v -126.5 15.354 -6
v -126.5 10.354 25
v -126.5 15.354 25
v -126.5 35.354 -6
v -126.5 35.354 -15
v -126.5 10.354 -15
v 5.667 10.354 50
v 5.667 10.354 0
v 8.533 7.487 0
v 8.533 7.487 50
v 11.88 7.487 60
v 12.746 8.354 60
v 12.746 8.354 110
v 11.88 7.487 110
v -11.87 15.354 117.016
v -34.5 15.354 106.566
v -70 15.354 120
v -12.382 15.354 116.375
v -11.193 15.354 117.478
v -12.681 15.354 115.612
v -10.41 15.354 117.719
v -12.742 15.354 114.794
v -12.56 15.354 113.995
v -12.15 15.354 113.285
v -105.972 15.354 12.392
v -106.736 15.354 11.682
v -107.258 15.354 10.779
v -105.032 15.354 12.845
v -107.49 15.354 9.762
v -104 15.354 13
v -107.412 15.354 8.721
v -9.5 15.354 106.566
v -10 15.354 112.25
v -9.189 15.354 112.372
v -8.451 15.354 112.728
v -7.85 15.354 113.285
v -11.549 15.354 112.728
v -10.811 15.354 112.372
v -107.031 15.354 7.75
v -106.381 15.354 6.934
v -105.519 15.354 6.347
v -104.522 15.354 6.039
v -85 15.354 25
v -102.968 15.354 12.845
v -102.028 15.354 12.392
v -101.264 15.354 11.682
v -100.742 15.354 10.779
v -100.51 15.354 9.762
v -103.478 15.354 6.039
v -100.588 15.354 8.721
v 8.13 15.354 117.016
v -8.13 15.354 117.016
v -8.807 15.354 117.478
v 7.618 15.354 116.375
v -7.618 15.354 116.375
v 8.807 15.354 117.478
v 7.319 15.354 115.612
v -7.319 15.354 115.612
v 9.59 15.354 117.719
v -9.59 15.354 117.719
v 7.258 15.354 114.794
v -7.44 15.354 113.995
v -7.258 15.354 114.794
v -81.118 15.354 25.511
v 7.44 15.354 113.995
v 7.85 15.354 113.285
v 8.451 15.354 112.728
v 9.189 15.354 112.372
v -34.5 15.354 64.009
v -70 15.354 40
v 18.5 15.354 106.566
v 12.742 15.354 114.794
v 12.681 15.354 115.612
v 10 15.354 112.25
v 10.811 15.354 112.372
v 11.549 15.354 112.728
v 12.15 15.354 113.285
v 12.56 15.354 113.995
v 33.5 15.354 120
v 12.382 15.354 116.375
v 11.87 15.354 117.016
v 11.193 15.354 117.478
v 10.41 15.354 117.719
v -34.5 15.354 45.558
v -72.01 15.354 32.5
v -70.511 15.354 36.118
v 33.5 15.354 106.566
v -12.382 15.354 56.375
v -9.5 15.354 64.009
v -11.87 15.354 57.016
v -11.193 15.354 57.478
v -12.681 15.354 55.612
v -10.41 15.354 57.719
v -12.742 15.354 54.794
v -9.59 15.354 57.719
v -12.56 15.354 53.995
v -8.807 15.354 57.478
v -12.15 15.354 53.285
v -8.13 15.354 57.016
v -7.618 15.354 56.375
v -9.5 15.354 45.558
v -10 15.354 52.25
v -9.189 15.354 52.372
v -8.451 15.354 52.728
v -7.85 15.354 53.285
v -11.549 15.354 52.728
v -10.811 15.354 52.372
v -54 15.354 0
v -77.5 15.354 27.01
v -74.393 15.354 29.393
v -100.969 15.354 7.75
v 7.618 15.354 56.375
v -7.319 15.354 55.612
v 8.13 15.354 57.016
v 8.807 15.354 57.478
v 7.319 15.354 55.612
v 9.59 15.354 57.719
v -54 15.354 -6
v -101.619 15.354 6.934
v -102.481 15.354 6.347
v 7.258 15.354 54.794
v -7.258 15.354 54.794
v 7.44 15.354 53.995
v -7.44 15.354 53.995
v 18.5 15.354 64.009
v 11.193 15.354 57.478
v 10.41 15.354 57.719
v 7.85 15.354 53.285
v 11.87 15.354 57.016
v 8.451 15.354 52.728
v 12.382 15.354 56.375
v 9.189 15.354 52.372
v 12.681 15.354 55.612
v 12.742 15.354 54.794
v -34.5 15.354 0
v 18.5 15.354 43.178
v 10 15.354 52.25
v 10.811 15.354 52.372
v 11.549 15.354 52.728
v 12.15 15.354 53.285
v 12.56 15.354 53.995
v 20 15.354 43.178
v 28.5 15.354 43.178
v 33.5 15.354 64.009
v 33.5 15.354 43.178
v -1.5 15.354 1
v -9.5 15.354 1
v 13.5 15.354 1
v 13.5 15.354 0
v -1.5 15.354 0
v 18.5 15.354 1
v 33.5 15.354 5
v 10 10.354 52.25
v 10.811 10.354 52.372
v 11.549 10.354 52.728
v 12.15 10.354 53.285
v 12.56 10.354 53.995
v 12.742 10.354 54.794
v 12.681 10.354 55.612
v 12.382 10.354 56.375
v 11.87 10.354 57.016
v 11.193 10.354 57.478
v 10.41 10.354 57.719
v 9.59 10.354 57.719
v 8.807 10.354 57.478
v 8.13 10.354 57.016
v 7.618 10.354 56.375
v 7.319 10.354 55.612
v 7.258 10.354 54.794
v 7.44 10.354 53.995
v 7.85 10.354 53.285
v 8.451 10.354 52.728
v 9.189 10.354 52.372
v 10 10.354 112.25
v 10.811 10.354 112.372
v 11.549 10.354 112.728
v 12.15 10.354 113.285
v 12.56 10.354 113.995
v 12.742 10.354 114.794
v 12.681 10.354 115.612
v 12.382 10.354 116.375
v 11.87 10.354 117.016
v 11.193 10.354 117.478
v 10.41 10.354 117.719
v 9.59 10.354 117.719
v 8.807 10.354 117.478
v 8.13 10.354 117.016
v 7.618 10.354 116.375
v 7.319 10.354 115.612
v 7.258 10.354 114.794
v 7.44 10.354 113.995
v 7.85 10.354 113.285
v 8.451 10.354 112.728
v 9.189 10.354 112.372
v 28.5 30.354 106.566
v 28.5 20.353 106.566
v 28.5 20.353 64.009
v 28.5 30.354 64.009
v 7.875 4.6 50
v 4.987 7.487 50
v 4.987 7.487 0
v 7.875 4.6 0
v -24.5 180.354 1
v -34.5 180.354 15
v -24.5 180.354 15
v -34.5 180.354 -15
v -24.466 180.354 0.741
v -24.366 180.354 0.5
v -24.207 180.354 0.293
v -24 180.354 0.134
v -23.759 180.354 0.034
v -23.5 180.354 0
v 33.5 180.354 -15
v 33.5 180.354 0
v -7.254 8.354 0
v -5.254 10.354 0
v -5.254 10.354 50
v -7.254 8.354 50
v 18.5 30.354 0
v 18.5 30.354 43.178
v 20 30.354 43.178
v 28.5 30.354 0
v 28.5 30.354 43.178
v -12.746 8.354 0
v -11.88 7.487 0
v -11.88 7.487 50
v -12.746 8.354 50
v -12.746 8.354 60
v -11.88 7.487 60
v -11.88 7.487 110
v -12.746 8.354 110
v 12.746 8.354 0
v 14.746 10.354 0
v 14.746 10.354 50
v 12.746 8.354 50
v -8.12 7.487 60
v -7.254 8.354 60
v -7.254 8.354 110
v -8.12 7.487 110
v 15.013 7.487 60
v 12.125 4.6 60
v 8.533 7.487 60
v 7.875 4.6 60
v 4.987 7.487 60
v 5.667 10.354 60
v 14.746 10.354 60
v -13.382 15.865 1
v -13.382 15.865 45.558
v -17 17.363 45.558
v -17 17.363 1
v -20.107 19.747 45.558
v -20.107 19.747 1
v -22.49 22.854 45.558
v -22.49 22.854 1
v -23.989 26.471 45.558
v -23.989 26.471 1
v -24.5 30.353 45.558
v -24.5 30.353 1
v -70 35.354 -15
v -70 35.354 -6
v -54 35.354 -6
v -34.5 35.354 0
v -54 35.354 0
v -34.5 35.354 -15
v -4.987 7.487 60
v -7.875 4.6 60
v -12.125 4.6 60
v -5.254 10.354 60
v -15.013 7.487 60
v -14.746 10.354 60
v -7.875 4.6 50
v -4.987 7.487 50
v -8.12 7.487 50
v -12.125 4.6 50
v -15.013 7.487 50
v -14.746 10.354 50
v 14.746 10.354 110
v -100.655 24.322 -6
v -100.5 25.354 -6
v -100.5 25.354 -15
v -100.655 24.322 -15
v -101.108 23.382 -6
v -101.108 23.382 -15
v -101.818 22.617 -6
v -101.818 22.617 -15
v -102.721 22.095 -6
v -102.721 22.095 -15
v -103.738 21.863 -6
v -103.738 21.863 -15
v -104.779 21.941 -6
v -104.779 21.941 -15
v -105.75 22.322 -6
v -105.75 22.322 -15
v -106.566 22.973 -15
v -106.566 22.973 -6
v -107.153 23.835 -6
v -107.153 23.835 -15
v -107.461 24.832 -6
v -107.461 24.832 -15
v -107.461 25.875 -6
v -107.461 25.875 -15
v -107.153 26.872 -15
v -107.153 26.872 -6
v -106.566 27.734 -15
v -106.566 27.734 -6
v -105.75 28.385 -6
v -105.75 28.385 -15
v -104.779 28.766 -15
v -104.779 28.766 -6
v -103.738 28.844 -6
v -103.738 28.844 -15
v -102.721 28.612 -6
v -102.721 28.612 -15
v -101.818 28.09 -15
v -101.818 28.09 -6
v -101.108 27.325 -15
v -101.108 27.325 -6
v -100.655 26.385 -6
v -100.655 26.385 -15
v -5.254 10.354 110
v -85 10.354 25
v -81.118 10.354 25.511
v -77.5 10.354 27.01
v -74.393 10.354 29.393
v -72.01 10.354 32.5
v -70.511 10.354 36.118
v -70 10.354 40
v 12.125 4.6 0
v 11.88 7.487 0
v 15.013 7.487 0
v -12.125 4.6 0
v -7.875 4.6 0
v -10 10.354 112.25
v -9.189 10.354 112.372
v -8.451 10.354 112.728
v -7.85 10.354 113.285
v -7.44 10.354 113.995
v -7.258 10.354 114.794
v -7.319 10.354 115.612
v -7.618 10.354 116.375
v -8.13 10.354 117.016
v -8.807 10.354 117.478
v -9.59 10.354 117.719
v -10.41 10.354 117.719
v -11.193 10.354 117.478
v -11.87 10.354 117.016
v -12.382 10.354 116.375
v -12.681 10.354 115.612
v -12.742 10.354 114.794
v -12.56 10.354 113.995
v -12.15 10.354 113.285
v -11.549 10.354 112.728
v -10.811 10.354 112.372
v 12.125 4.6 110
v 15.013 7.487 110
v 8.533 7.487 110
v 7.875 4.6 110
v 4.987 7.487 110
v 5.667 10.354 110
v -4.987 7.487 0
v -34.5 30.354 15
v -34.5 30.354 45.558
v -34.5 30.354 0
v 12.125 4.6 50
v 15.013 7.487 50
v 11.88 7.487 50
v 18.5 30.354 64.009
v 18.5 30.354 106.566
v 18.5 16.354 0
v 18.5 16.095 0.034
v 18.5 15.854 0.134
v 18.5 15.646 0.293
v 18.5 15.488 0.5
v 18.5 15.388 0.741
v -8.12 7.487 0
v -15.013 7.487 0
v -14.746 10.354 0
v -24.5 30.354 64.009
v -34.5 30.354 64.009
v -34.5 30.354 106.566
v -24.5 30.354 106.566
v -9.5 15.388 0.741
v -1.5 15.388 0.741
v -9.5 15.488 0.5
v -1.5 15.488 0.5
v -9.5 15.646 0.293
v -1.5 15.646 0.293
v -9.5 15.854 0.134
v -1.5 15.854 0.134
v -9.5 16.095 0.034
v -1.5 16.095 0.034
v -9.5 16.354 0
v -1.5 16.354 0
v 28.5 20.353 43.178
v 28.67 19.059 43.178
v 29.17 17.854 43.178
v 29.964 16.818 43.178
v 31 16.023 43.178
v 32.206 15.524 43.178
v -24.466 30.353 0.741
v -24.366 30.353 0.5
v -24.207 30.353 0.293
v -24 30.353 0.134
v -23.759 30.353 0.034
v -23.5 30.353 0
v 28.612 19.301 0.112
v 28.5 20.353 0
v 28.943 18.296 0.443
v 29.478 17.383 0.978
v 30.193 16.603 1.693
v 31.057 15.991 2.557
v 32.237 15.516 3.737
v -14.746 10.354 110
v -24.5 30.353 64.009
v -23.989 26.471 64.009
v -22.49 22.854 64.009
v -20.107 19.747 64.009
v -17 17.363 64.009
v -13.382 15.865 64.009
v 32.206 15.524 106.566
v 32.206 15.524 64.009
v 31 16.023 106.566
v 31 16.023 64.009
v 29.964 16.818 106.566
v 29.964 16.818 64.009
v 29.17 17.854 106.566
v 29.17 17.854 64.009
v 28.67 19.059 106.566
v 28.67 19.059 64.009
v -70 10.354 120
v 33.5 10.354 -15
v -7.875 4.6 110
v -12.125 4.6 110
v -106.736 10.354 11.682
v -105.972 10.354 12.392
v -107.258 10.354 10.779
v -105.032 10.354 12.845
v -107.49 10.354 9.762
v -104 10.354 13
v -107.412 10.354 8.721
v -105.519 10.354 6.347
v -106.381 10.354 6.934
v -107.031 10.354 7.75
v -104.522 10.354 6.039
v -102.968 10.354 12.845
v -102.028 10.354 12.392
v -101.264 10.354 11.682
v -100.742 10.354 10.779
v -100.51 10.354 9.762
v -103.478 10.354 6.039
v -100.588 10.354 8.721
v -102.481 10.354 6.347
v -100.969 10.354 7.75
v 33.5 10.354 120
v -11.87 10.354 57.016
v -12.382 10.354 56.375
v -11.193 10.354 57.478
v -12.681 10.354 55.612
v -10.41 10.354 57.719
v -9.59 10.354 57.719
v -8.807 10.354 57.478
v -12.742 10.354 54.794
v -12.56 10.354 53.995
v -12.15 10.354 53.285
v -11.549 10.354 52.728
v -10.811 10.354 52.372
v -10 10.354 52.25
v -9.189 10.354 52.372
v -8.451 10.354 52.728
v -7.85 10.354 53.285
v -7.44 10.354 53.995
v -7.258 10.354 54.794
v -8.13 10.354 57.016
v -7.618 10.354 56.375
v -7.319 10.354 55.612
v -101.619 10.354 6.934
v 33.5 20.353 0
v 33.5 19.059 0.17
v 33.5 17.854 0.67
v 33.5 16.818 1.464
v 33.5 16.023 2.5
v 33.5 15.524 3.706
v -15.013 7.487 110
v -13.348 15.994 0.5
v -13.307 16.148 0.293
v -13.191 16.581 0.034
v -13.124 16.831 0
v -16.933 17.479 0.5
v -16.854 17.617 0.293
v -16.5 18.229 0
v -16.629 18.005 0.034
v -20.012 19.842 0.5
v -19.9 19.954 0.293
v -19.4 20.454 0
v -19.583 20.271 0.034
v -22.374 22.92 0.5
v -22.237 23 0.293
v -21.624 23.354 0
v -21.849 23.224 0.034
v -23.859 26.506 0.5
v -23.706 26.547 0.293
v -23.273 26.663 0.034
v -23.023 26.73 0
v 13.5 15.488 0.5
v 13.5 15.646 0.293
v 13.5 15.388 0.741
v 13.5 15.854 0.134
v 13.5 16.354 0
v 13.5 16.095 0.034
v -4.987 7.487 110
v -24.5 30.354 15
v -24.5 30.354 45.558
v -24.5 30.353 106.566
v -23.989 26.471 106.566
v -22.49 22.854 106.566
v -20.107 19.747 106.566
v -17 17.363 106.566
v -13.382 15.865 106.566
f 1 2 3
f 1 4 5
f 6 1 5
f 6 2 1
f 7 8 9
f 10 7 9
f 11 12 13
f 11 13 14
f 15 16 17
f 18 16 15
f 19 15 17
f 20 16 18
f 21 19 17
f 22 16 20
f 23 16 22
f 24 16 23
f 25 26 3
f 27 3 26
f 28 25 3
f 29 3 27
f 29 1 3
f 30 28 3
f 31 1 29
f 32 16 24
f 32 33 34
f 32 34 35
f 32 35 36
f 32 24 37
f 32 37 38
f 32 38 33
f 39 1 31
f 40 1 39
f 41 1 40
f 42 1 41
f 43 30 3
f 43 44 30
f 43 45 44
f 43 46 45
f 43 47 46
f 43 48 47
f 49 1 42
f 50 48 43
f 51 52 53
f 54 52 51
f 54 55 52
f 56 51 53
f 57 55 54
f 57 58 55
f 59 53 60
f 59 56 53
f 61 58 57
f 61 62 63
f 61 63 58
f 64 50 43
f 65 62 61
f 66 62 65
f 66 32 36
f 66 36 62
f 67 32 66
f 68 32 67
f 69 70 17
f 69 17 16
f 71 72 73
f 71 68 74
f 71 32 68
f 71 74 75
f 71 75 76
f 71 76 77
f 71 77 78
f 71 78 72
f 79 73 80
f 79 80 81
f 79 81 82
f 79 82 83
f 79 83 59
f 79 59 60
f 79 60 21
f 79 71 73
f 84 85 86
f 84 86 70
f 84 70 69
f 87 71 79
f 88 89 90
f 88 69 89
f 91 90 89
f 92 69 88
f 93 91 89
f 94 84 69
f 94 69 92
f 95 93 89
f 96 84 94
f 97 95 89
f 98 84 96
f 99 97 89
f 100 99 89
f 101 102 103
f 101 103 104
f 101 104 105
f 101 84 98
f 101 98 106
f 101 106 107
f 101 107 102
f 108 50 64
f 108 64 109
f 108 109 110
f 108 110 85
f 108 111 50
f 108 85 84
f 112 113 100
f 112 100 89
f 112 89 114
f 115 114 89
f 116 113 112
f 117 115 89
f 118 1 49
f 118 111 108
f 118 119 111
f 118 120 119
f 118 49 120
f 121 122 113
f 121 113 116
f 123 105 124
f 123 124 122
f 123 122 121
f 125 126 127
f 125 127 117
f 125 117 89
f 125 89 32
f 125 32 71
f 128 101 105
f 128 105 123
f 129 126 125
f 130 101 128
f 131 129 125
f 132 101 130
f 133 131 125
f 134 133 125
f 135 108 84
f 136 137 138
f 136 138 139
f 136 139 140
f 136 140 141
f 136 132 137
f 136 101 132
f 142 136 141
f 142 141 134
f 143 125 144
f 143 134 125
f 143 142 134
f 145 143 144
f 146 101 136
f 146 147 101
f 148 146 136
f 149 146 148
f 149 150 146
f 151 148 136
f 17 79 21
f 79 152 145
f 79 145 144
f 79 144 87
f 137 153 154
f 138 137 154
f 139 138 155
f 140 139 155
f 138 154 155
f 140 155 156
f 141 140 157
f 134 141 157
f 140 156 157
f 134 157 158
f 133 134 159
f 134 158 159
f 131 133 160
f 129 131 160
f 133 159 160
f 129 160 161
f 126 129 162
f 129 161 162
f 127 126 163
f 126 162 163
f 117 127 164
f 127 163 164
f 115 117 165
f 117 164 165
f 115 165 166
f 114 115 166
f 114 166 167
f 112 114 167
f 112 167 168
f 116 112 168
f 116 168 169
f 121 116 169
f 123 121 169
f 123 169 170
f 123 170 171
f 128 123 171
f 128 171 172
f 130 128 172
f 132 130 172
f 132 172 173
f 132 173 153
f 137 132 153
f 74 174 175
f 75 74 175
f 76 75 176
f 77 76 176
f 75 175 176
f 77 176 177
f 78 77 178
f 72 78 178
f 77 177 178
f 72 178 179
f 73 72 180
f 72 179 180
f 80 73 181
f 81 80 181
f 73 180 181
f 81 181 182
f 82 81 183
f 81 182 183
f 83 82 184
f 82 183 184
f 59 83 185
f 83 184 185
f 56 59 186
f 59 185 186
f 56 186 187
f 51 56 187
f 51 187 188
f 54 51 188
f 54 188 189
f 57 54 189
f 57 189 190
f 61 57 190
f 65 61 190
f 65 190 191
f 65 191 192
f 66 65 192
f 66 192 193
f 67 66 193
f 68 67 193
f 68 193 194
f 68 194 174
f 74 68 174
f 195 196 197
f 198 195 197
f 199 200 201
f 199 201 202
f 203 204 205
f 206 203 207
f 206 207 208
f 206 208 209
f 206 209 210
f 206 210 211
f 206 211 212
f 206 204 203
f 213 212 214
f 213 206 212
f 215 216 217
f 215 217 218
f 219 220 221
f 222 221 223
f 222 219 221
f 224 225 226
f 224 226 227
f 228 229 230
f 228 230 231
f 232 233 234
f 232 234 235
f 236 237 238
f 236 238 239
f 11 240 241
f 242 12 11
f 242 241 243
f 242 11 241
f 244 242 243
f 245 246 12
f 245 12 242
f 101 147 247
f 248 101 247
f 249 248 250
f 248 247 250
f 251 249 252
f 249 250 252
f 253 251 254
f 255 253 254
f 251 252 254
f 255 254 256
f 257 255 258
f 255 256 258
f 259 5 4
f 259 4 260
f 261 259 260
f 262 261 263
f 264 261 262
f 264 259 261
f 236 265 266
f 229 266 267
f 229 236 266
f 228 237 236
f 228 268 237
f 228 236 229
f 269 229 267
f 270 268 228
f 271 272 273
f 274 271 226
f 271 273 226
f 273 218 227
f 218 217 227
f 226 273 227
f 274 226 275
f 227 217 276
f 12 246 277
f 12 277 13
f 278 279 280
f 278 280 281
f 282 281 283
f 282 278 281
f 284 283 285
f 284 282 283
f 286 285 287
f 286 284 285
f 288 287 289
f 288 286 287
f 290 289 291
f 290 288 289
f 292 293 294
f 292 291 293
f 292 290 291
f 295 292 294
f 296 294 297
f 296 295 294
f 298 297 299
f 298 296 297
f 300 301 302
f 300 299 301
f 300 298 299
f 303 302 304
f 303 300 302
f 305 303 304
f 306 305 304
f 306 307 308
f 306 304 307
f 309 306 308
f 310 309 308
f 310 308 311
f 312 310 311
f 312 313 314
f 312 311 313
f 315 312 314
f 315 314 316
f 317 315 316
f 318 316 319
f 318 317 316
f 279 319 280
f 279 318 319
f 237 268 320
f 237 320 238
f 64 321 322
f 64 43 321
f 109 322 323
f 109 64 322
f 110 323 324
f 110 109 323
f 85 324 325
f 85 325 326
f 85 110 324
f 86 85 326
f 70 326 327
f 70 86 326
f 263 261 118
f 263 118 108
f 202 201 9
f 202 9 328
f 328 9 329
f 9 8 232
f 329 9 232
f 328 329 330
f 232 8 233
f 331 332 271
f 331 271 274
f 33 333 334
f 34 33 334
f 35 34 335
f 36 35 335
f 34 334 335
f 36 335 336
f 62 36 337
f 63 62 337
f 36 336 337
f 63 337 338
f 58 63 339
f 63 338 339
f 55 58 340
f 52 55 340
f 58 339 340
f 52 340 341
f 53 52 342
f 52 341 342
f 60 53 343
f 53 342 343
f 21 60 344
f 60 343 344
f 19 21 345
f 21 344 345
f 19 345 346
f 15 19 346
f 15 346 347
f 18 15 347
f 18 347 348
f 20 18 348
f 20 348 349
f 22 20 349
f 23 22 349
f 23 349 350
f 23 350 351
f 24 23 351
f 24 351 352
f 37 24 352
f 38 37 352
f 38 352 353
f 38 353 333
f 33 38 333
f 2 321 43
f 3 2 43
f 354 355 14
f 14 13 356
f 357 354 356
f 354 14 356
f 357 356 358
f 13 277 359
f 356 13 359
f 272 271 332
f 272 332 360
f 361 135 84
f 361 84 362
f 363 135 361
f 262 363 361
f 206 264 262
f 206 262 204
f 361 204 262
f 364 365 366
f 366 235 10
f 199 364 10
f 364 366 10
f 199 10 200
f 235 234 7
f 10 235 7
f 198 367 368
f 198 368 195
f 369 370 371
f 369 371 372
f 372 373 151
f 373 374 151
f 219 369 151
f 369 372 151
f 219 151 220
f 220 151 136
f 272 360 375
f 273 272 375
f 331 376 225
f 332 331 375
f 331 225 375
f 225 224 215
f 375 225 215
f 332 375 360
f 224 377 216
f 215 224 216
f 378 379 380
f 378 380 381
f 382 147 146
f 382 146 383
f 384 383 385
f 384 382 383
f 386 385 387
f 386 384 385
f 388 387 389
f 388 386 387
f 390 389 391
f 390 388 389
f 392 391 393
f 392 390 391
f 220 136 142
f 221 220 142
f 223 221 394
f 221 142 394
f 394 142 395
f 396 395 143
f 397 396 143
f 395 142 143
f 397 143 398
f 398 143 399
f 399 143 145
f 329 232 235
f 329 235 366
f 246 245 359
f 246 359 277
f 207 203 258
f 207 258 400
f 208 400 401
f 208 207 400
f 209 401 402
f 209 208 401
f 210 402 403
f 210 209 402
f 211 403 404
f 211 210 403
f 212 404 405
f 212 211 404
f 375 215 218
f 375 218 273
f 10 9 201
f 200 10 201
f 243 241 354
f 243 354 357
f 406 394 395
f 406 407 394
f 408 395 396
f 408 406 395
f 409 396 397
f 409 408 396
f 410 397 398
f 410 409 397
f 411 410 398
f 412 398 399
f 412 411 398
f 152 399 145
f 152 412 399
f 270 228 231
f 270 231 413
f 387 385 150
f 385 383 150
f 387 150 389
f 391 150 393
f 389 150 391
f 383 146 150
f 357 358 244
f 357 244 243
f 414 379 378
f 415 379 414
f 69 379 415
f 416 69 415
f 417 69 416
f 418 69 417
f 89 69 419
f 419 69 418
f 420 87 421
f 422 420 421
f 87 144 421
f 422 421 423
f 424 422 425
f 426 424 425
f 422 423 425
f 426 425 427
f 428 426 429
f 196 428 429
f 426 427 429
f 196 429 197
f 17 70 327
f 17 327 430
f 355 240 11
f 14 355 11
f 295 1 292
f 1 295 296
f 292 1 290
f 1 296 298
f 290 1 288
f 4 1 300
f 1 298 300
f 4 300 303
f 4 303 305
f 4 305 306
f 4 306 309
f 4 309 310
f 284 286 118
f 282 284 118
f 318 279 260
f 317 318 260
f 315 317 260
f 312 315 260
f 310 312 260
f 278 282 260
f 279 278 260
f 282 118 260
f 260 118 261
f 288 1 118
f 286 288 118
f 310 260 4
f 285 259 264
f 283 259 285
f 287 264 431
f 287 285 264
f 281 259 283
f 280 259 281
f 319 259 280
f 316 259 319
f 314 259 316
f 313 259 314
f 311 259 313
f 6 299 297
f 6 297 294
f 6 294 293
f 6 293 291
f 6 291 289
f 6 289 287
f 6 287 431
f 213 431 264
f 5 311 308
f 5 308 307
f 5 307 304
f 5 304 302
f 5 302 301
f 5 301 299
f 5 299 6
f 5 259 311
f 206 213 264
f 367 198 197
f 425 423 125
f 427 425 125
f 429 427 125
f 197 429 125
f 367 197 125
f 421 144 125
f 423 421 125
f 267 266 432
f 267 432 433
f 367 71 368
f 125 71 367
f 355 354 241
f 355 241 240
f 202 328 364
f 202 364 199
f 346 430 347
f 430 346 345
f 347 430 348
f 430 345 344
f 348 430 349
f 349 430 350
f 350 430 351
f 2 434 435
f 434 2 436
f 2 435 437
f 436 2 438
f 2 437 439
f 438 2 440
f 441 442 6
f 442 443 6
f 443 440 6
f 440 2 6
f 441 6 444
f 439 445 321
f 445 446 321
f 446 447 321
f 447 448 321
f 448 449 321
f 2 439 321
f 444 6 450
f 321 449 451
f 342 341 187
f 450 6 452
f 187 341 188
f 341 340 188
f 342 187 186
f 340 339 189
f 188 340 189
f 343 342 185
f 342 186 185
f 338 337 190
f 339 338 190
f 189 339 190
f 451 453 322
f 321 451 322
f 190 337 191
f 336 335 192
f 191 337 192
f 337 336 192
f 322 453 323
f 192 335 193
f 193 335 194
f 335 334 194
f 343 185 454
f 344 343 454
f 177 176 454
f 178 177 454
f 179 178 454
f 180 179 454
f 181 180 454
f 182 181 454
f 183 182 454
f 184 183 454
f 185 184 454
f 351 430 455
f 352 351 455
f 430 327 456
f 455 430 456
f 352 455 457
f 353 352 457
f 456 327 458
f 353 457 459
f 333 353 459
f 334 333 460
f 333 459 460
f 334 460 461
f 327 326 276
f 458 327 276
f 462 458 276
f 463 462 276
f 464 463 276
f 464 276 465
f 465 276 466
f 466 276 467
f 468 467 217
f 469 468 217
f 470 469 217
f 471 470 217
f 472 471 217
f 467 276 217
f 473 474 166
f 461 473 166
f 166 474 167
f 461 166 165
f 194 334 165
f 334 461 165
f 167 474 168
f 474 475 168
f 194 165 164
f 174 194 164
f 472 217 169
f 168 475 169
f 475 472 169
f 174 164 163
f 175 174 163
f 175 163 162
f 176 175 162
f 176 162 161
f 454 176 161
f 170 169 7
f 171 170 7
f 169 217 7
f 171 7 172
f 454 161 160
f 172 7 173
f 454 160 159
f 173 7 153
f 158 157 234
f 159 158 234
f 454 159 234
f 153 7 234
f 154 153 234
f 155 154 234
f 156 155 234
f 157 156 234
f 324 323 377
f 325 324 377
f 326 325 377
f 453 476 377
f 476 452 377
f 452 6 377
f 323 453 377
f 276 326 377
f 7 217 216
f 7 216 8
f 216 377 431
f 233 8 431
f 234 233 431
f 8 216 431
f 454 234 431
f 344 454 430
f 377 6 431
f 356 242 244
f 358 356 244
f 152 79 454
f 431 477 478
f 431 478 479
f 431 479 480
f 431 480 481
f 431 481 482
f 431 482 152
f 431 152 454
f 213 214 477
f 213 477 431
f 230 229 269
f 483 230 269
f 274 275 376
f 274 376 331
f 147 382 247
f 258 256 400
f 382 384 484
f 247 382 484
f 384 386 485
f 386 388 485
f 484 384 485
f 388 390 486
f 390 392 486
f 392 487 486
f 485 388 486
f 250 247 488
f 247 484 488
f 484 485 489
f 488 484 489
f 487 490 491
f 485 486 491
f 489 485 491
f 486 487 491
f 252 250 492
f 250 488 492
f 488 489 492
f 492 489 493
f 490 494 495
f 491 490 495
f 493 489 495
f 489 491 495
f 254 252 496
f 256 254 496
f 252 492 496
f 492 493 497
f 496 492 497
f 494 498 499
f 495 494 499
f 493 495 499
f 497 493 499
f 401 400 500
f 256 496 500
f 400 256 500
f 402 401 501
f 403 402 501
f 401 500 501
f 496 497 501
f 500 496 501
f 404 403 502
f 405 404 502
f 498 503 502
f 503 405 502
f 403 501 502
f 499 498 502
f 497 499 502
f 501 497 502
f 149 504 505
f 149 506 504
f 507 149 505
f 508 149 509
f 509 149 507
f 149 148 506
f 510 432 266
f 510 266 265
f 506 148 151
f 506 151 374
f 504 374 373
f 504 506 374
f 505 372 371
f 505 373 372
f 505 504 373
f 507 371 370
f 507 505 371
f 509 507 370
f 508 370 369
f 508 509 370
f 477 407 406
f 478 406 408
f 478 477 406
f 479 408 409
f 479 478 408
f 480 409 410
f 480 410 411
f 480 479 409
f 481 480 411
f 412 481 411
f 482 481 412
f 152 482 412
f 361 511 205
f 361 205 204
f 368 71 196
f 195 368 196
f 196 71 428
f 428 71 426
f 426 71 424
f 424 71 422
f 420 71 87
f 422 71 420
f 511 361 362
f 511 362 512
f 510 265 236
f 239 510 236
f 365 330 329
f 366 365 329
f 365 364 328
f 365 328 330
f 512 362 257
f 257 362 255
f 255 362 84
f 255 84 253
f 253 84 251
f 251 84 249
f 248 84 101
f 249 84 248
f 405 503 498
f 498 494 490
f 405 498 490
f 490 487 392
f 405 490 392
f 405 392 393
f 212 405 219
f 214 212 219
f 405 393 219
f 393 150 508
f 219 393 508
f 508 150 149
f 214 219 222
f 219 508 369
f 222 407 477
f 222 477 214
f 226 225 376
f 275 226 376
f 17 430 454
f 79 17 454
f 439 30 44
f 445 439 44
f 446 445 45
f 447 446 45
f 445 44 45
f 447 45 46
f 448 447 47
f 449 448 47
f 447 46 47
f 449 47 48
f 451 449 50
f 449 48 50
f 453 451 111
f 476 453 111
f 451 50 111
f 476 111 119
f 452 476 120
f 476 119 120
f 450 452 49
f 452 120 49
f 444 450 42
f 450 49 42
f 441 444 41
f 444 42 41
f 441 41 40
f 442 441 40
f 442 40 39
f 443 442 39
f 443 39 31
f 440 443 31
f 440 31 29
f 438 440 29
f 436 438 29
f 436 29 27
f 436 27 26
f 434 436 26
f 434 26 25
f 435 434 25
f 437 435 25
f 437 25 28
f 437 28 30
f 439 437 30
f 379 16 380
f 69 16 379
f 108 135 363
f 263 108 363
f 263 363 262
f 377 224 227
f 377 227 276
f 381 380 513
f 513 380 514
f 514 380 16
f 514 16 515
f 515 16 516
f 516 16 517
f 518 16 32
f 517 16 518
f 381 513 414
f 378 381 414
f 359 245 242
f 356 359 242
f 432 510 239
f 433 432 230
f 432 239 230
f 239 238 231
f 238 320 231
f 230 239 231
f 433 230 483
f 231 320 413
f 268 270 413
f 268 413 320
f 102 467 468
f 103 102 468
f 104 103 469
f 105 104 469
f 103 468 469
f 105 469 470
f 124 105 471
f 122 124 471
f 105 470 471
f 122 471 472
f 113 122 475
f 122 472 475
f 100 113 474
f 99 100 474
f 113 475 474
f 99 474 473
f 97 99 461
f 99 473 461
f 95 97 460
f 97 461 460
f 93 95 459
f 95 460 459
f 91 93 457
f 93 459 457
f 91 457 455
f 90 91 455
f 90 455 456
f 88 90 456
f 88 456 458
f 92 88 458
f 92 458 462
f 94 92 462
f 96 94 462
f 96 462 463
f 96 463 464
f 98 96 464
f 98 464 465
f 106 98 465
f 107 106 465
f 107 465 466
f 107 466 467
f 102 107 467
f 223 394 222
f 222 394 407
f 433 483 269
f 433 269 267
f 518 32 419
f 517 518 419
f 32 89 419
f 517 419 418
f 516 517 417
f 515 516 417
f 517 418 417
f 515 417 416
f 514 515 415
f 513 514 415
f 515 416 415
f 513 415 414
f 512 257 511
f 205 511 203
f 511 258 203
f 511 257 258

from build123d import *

# Parameters (mm, degrees)
BOSS_EXTRUDE1_DEPTH      = 250
BOSS_EXTRUDE2_DEPTH      = 50
BOSS_EXTRUDE2_2_DEPTH    = 50
LPATTERN1_COUNT          = 4
LPATTERN1_PITCH          = 60
SKETCH2_R                = 2.75
CUT_EXTRUDE1_DEPTH       = 251.864711302
UPPER_ACRYLIC_SUPP_W     = 20
UPPER_ACRYLIC_SUPP_H     = 250
BOSS_EXTRUDE3_DEPTH      = 5
UPPER_ACRYLIC_SUPP_3_W   = 10
UPPER_ACRYLIC_SUPP_3_H   = 66.073604859
UPPER_ACRYLIC_SUPP_3_H_2 = 41.475217291
UPPER_ACRYLIC_SUPP_3_H_3 = 42.557179481
UPPER_ACRYLIC_SUPP_3_H_4 = 45.558340935
BOSS_EXTRUDE4_DEPTH      = 15
FILLET1_R                = 15
SKETCH4_W                = 60
SKETCH4_H                = 15
BOSS_EXTRUDE5_DEPTH      = 5
SKETCH4_3_W              = 60
SKETCH4_3_H              = 15
BOSS_EXTRUDE6_DEPTH      = 60
SKETCH5_W                = 10
SKETCH5_H                = 45
BOSS_EXTRUDE7_DEPTH      = 15
BOSS_EXTRUDE8_START      = 250
SKETCH5_3_W              = 10
SKETCH5_3_H              = 45
BOSS_EXTRUDE8_DEPTH      = 15
FILLET2_R                = 1
SKETCH6_W                = 6
SKETCH6_H                = 60
CUT_EXTRUDE2_DEPTH       = 6
BOSS_EXTRUDE9_DEPTH      = 30
SKETCH8_W                = 333.602701612
SKETCH8_H                = 59.031331047
CUT_EXTRUDE3_DEPTH       = 150
SKETCH9_W                = 6
SKETCH9_H                = 20
CLOTH_ESCAPE_GAP_DEPTH   = 20
SKETCH11_W               = 9
SKETCH11_H               = 20
BOSS_EXTRUDE11_DEPTH     = 100
CUT_EXTRUDE4_DEPTH       = 68
SKETCH13_W               = 40
SKETCH13_H               = 5
BOSS_EXTRUDE13_DEPTH     = 100
CUT_EXTRUDE5_DEPTH       = 100
FILLET3_R                = 15
BOSS_EXTRUDE14_START     = -5
BOSS_EXTRUDE14_DEPTH     = 25
CUT_EXTRUDE6_DEPTH       = 30
CUT_EXTRUDE6_DEPTH_BACK  = 10
SKETCH16_5_W             = 8.5
SKETCH16_5_H             = 41.475217291
SKETCH16_5_H_2           = 42.557179481
SKETCH16_5_W_2           = 1.5
SKETCH16_5_H_3           = 42.177819043
SKETCH16_5_H_4           = 20.831100018
SKETCH16_5_H_5           = 17.311395043
SKETCH16_5_H_6           = 18.573684265
SKETCH16_5_H_7           = 65.073604859
SKETCH16_6_W             = 8.5
SKETCH16_6_H             = 41.475217291
SKETCH16_6_H_2           = 42.557179481
SKETCH16_6_W_2           = 1.5
SKETCH16_6_H_3           = 42.177819043
SKETCH16_6_H_4           = 20.831100018
SKETCH16_6_H_5           = 17.311395043
SKETCH16_6_H_6           = 18.573684265
SKETCH16_6_H_7           = 65.073604859
BOSS_EXTRUDE15_DEPTH     = 5
BOSS_EXTRUDE16_DEPTH     = 20
SKETCH16_8_W             = 8.5
SKETCH16_8_H             = 41.475217291
SKETCH16_8_H_2           = 42.557179481
SKETCH16_8_W_2           = 1.5
SKETCH16_8_H_3           = 42.177819043
SKETCH16_8_H_4           = 65.073604859
BOSS_EXTRUDE17_DEPTH     = 15
BOSS_EXTRUDE18_START     = -5
BOSS_EXTRUDE18_DEPTH     = 25
FILLET4_R                = 5
BOSS_EXTRUDE21_START     = 145
BOSS_EXTRUDE21_DEPTH     = 170
SKETCH19_R               = 3.5
CUT_EXTRUDE7_DEPTH       = 10
CUT_EXTRUDE8_DEPTH       = 355
CUT_EXTRUDE8_DEPTH_BACK  = 10
SKETCH20_R               = 3.5
SKETCH21_W               = 15
SKETCH21_H               = 197.501027769
CUT_EXTRUDE9_DEPTH       = 340
SKETCH22_W               = 160
SKETCH22_H               = 135
SKETCH22_H_2             = 10
CUT_EXTRUDE10_DEPTH      = 217


with BuildPart() as part:
    # profile → Boss-Extrude1 (new body)
    with BuildSketch(Plane.XY):
        Polygon((-14.746446609, 10.353553391), (-5.253553391, 10.353553391), (5.667330529, 10.353553391), (14.746446609, 10.353553391), (20, 10.353553391), (20, 15.353553391), (-20, 15.353553391), (-20, 10.353553391), align=None)
    extrude(amount=BOSS_EXTRUDE1_DEPTH)

    # Sketch2 → Cut-Extrude1 (cut, through all)
    with BuildSketch(Plane.XZ.offset(-10.353553391)):
        with Locations(Location((-10, 175, 0), (0, 0, 270))):
            Circle(SKETCH2_R)
        with Locations(Location((10, 175, 0), (0, 0, 270))):
            Circle(SKETCH2_R)
        with Locations(Location((-10, 115, 0), (0, 0, 270))):
            Circle(SKETCH2_R)
        with Locations(Location((10, 115, 0), (0, 0, 270))):
            Circle(SKETCH2_R)
        with Locations(Location((-10, 55, 0), (0, 0, 270))):
            Circle(SKETCH2_R)
        with Locations(Location((10, 55, 0), (0, 0, 270))):
            Circle(SKETCH2_R)
    extrude(amount=-CUT_EXTRUDE1_DEPTH, mode=Mode.SUBTRACT)

    # upper_acrylic_supp → Boss-Extrude3 (add)
    with BuildSketch(Plane(origin=(0, 15.353553391, 0), x_dir=(1, 0, 0), z_dir=(0, 1, 0))):
        with Locations((-30, -125)):
            Rectangle(UPPER_ACRYLIC_SUPP_W, UPPER_ACRYLIC_SUPP_H)
    extrude(amount=-BOSS_EXTRUDE3_DEPTH)

    # upper_acrylic_supp<3> → Boss-Extrude4 (add)
    with BuildSketch(Plane(origin=(0, 15.353553391, 0), x_dir=(1, 0, 0), z_dir=(0, 1, 0))):
        with Locations((-29.5, -216.963197571)):
            Rectangle(UPPER_ACRYLIC_SUPP_3_W, UPPER_ACRYLIC_SUPP_3_H)
        with Locations((-29.5, -144.615102231)):
            Rectangle(UPPER_ACRYLIC_SUPP_3_W, UPPER_ACRYLIC_SUPP_3_H_2)
        with Locations((-29.5, -85.287508801)):
            Rectangle(UPPER_ACRYLIC_SUPP_3_W, UPPER_ACRYLIC_SUPP_3_H_3)
        with Locations((-29.5, -22.779170468)):
            Rectangle(UPPER_ACRYLIC_SUPP_3_W, UPPER_ACRYLIC_SUPP_3_H_4)
    extrude(amount=BOSS_EXTRUDE4_DEPTH)

    # Fillet1
    fillet1_edges = [part.edges().sort_by_distance(p)[0] for p in [
        (-24.5, 15.353553391, 22.779170467),
        (-24.5, 15.353553391, 85.287508801),
        (-24.5, 15.353553391, 144.615102231),
        (-24.5, 15.353553391, 216.963197571),
    ]]
    fillet(fillet1_edges, radius=FILLET1_R - 0.0001)  # a hair under: the kernel refuses the full size



with BuildPart() as body_2:
    # Sketch1<3> → Boss-Extrude2 (new body)
    with BuildSketch(Plane.XY):
        Polygon((-7.253553391, 8.353553391), (-8.119669914, 7.487436867), (-5.5, 7.487436867), (-4.987436867, 7.487436867), (-5.5, 6.974873734), (-7.874873734, 4.6), (-12.125126266, 4.6), (-14.5, 6.974873734), (-15.012563133, 7.487436867), (-14.5, 7.487436867), (-11.880330086, 7.487436867), (-12.746446609, 8.353553391), (-14.746446609, 10.353553391), (-5.253553391, 10.353553391), align=None)
    boss_extrude2 = extrude(amount=BOSS_EXTRUDE2_DEPTH)


with BuildPart() as body_3:
    # Sketch1<3> → Boss-Extrude2 2 (new body)
    with BuildSketch(Plane.XY):
        Polygon((12.746446609, 8.353553391), (11.880330086, 7.487436867), (14.5, 7.487436867), (15.012563133, 7.487436867), (14.5, 6.974873734), (12.125126266, 4.6), (7.874873734, 4.6), (5.5, 6.974873734), (4.987436867, 7.487436867), (5.5, 7.487436867), (8.533447053, 7.487436867), (7.667330529, 8.353553391), (5.667330529, 10.353553391), (14.746446609, 10.353553391), align=None)
    boss_extrude2_2 = extrude(amount=BOSS_EXTRUDE2_2_DEPTH)


with BuildPart() as lpattern1_1:
    # LPattern1: pattern copy
    add(boss_extrude2.moved(Location(Vector(0, 0, 1) * (1 * LPATTERN1_PITCH))))


with BuildPart() as lpattern1_2:
    # LPattern1: pattern copy
    add(boss_extrude2.moved(Location(Vector(0, 0, 1) * (2 * LPATTERN1_PITCH))))


with BuildPart() as lpattern1_3:
    # LPattern1: pattern copy
    add(boss_extrude2.moved(Location(Vector(0, 0, 1) * (3 * LPATTERN1_PITCH))))


with BuildPart() as lpattern1_4:
    # LPattern1: pattern copy
    add(boss_extrude2_2.moved(Location(Vector(0, 0, 1) * (1 * LPATTERN1_PITCH))))


with BuildPart() as lpattern1_5:
    # LPattern1: pattern copy
    add(boss_extrude2_2.moved(Location(Vector(0, 0, 1) * (2 * LPATTERN1_PITCH))))


with BuildPart() as lpattern1_6:
    # LPattern1: pattern copy
    add(boss_extrude2_2.moved(Location(Vector(0, 0, 1) * (3 * LPATTERN1_PITCH))))


with BuildPart() as part_1:
    add(part.part)

    add(body_2.part)  # Boss-Extrude5 merges body 2

    add(body_3.part)  # Boss-Extrude5 merges body 3
    # Sketch4 → Boss-Extrude5 (add, symmetric)
    with BuildSketch(Plane(origin=(0, 15.353553391, 0), x_dir=(1, 0, 0), z_dir=(0, 1, 0))):
        with Locations((-10, -257.5)):
            Rectangle(SKETCH4_W, SKETCH4_H)
        with Locations((-10, 7.5)):
            Rectangle(SKETCH4_W, SKETCH4_H)
    extrude(amount=BOSS_EXTRUDE5_DEPTH, both=True)

    # Sketch4<3> → Boss-Extrude6 (add)
    with BuildSketch(Plane(origin=(0, 15.353553391, 0), x_dir=(1, 0, 0), z_dir=(0, 1, 0))):
        with Locations((-10, -257.5)):
            Rectangle(SKETCH4_3_W, SKETCH4_3_H)
        with Locations((-10, 7.5)):
            Rectangle(SKETCH4_3_W, SKETCH4_3_H)
    extrude(amount=BOSS_EXTRUDE6_DEPTH)

    # Sketch5 → Boss-Extrude7 (add)
    with BuildSketch(Plane(origin=(0, 0, 250), x_dir=(-1, 0, 0), z_dir=(0, 0, -1))):
        with Locations((29.5, 52.853553391)):
            Rectangle(SKETCH5_W, SKETCH5_H)
    extrude(amount=BOSS_EXTRUDE7_DEPTH)

    # Sketch5<3> → Boss-Extrude8 (add)
    with BuildSketch(Plane(origin=(0, 0, 250), x_dir=(-1, 0, 0), z_dir=(0, 0, -1)).offset(BOSS_EXTRUDE8_START)):
        with Locations((29.5, 52.853553391)):
            Rectangle(SKETCH5_3_W, SKETCH5_3_H)
    extrude(amount=-BOSS_EXTRUDE8_DEPTH)

    # Fillet2
    fillet2_edges = [part_1.edges().sort_by_distance(p)[0] for p in [
        (-24.5, 52.853503391, 250),
        (-24.5, 52.853503391, 0),
        (5.24995, 15.353553391, 250),
        (-20.106631007, 19.746922384, 250),
        (-20.106631007, 19.746922384, 0),
        (5.24995, 15.353553391, 0),
    ]]
    fillet(fillet2_edges, radius=FILLET2_R)

    # Sketch6 → Cut-Extrude2 (cut)
    with BuildSketch(Plane.ZY.offset(40)):
        with Locations((253, 45.353553391)):
            Rectangle(SKETCH6_W, SKETCH6_H)
        with Locations((-3, 45.353553391)):
            Rectangle(SKETCH6_W, SKETCH6_H)
    extrude(amount=-CUT_EXTRUDE2_DEPTH, mode=Mode.SUBTRACT)

    # Sketch7 → Boss-Extrude9 (add)
    with BuildSketch(Plane.ZY.offset(40)):
        Polygon((265, 75.353553391), (256, 75.353553391), (256, 15.353553391), (-6, 15.353553391), (-6, 75.353553391), (-15, 75.353553391), (-15, 10.353553391), (265, 10.353553391), align=None)
    extrude(amount=BOSS_EXTRUDE9_DEPTH)

    # Sketch8 → Cut-Extrude3 (cut)
    with BuildSketch(Plane.ZY.offset(70)):
        with Locations((122.426839416, 64.869218915)):
            Rectangle(SKETCH8_W, SKETCH8_H)
    extrude(amount=-CUT_EXTRUDE3_DEPTH, mode=Mode.SUBTRACT)

    # Sketch9 → cloth_escape_gap (add)
    with BuildSketch(Plane.ZY.offset(34)):
        with Locations((253, 25.353553391)):
            Rectangle(SKETCH9_W, SKETCH9_H)
        with Locations((-3, 25.353553391)):
            Rectangle(SKETCH9_W, SKETCH9_H)
    extrude(amount=CLOTH_ESCAPE_GAP_DEPTH)

    # Sketch11 → Boss-Extrude11 (add)
    with BuildSketch(Plane.ZY.offset(70)):
        with Locations((-10.5, 25.353553391)):
            Rectangle(SKETCH11_W, SKETCH11_H)
        with Locations((260.5, 25.353553391)):
            Rectangle(SKETCH11_W, SKETCH11_H)
    extrude(amount=BOSS_EXTRUDE11_DEPTH)

    # Sketch12 → Cut-Extrude4 (cut)
    with BuildSketch(Plane.XZ.offset(-10.353553391)):
        Polygon((-170, 265), (-70, 265), (-170, 260.5), align=None)
        Polygon((-70, -15), (-170, -10.5), (-170, -15), align=None)
    extrude(amount=-CUT_EXTRUDE4_DEPTH, mode=Mode.SUBTRACT)

    # Sketch13 → Boss-Extrude13 (add)
    with BuildSketch(Plane.ZY.offset(70)):
        with Locations((5, 12.853553391)):
            Rectangle(SKETCH13_W, SKETCH13_H)
        with Locations((245, 12.853553391)):
            Rectangle(SKETCH13_W, SKETCH13_H)
    extrude(amount=BOSS_EXTRUDE13_DEPTH)

    # Sketch14 → Cut-Extrude5 (cut)
    with BuildSketch(Plane(origin=(0, 15.353553391, 0), x_dir=(1, 0, 0), z_dir=(0, 1, 0))):
        Polygon((-70, -265), (-170, -260.5), (-170, -265), align=None)
        Polygon((-170, 15), (-170, 10.5), (-70, 15), align=None)
    extrude(amount=-CUT_EXTRUDE5_DEPTH, mode=Mode.SUBTRACT)

    # Fillet3
    fillet3_edges = [part_1.edges().sort_by_distance(p)[0] for p in [
        (-70, 12.853553391, 25),
        (-70, 12.853553391, 225),
    ]]
    fillet(fillet3_edges, radius=FILLET3_R)

    # Sketch16 → Boss-Extrude14 (add)
    with BuildSketch(Plane(origin=(0, 15.353553391, 0), x_dir=(1, 0, 0), z_dir=(0, 1, 0)).offset(BOSS_EXTRUDE14_START)):
        Polygon((28.5, 0), (33.5, 0), (33.5, 15), (18.5, 15), (18.5, 0), align=None)
        Polygon((18.5, -250), (18.5, -265), (33.5, -265), (33.5, -250), (28.5, -250), align=None)
    extrude(amount=BOSS_EXTRUDE14_DEPTH)

    # Sketch16<5> → Cut-Extrude6 (cut, two sides: drawn at the far end of the back side and taken through both)
    with BuildSketch(Plane(origin=(0, 15.353553391, 0), x_dir=(1, 0, 0), z_dir=(0, 1, 0)).offset(-CUT_EXTRUDE6_DEPTH_BACK)):
        Polygon((18.5, -250), (18.5, -265), (33.5, -265), (33.5, -250), (28.5, -250), align=None)
        Polygon((28.5, -250), (33.5, -250), (33.5, 0), (28.5, 0), (28.5, -43.177819043), (20, -43.177819043), (20, -64.008919061), (28.5, -64.008919061), (28.5, -106.566098542), (20, -106.566098542), (20, -123.877493585), (28.5, -123.877493585), (28.5, -165.352710876), (20, -165.352710876), (20, -183.926395141), (28.5, -183.926395141), align=None)
        with Locations((24.25, -144.615102231)):
            Rectangle(SKETCH16_5_W, SKETCH16_5_H)
        with Locations((24.25, -85.287508801)):
            Rectangle(SKETCH16_5_W, SKETCH16_5_H_2)
        Polygon((28.5, -43.177819043), (28.5, 0), (18.5, 0), (18.5, -1), (20, -1), (20, -43.177819043), align=None)
        Polygon((28.5, 0), (33.5, 0), (33.5, 15), (18.5, 15), (18.5, 0), align=None)
        with Locations((19.25, -22.088909521)):
            Rectangle(SKETCH16_5_W_2, SKETCH16_5_H_3)
        with Locations((19.25, -53.593369052)):
            Rectangle(SKETCH16_5_W_2, SKETCH16_5_H_4)
        with Locations((19.25, -85.287508801)):
            Rectangle(SKETCH16_5_W_2, SKETCH16_5_H_2)
        with Locations((19.25, -115.221796064)):
            Rectangle(SKETCH16_5_W_2, SKETCH16_5_H_5)
        with Locations((19.25, -144.615102231)):
            Rectangle(SKETCH16_5_W_2, SKETCH16_5_H)
        with Locations((19.25, -174.639553009)):
            Rectangle(SKETCH16_5_W_2, SKETCH16_5_H_6)
        with Locations((19.25, -216.463197571)):
            Rectangle(SKETCH16_5_W_2, SKETCH16_5_H_7)
        Polygon((18.5, -249), (18.5, -250), (28.5, -250), (28.5, -183.926395141), (20, -183.926395141), (20, -249), align=None)
    extrude(amount=CUT_EXTRUDE6_DEPTH + CUT_EXTRUDE6_DEPTH_BACK, mode=Mode.SUBTRACT)

    # Sketch16<6> → Boss-Extrude15 (add)
    with BuildSketch(Plane(origin=(0, 15.353553391, 0), x_dir=(1, 0, 0), z_dir=(0, 1, 0))):
        Polygon((28.5, -250), (33.5, -250), (33.5, 0), (28.5, 0), (28.5, -43.177819043), (20, -43.177819043), (20, -64.008919061), (28.5, -64.008919061), (28.5, -106.566098542), (20, -106.566098542), (20, -123.877493585), (28.5, -123.877493585), (28.5, -165.352710876), (20, -165.352710876), (20, -183.926395141), (28.5, -183.926395141), align=None)
        Polygon((18.5, -249), (18.5, -250), (28.5, -250), (28.5, -183.926395141), (20, -183.926395141), (20, -249), align=None)
        Polygon((18.5, -250), (18.5, -265), (33.5, -265), (33.5, -250), (28.5, -250), align=None)
        with Locations((24.25, -144.615102231)):
            Rectangle(SKETCH16_6_W, SKETCH16_6_H)
        with Locations((24.25, -85.287508801)):
            Rectangle(SKETCH16_6_W, SKETCH16_6_H_2)
        Polygon((28.5, -43.177819043), (28.5, 0), (18.5, 0), (18.5, -1), (20, -1), (20, -43.177819043), align=None)
        Polygon((28.5, 0), (33.5, 0), (33.5, 15), (18.5, 15), (18.5, 0), align=None)
        with Locations((19.25, -22.088909521)):
            Rectangle(SKETCH16_6_W_2, SKETCH16_6_H_3)
        with Locations((19.25, -53.593369052)):
            Rectangle(SKETCH16_6_W_2, SKETCH16_6_H_4)
        with Locations((19.25, -85.287508801)):
            Rectangle(SKETCH16_6_W_2, SKETCH16_6_H_2)
        with Locations((19.25, -115.221796064)):
            Rectangle(SKETCH16_6_W_2, SKETCH16_6_H_5)
        with Locations((19.25, -144.615102231)):
            Rectangle(SKETCH16_6_W_2, SKETCH16_6_H)
        with Locations((19.25, -174.639553009)):
            Rectangle(SKETCH16_6_W_2, SKETCH16_6_H_6)
        with Locations((19.25, -216.463197571)):
            Rectangle(SKETCH16_6_W_2, SKETCH16_6_H_7)
    extrude(amount=-BOSS_EXTRUDE15_DEPTH)

    # Sketch16<7> → Boss-Extrude16 (add)
    with BuildSketch(Plane(origin=(0, 15.353553391, 0), x_dir=(1, 0, 0), z_dir=(0, 1, 0))):
        Polygon((18.5, -250), (18.5, -265), (33.5, -265), (33.5, -250), (28.5, -250), align=None)
        Polygon((28.5, 0), (33.5, 0), (33.5, 15), (18.5, 15), (18.5, 0), align=None)
    extrude(amount=BOSS_EXTRUDE16_DEPTH)

    # Sketch16<8> → Boss-Extrude17 (add)
    with BuildSketch(Plane(origin=(0, 15.353553391, 0), x_dir=(1, 0, 0), z_dir=(0, 1, 0))):
        Polygon((18.5, -249), (18.5, -250), (28.5, -250), (28.5, -183.926395141), (20, -183.926395141), (20, -249), align=None)
        with Locations((24.25, -144.615102231)):
            Rectangle(SKETCH16_8_W, SKETCH16_8_H)
        with Locations((24.25, -85.287508801)):
            Rectangle(SKETCH16_8_W, SKETCH16_8_H_2)
        Polygon((28.5, -43.177819043), (28.5, 0), (18.5, 0), (18.5, -1), (20, -1), (20, -43.177819043), align=None)
        with Locations((19.25, -22.088909521)):
            Rectangle(SKETCH16_8_W_2, SKETCH16_8_H_3)
        with Locations((19.25, -85.287508801)):
            Rectangle(SKETCH16_8_W_2, SKETCH16_8_H_2)
        with Locations((19.25, -144.615102231)):
            Rectangle(SKETCH16_8_W_2, SKETCH16_8_H)
        with Locations((19.25, -216.463197571)):
            Rectangle(SKETCH16_8_W_2, SKETCH16_8_H_4)
    extrude(amount=BOSS_EXTRUDE17_DEPTH)

    # Sketch14<2> → Boss-Extrude18 (add)
    with BuildSketch(Plane(origin=(0, 15.353553391, 0), x_dir=(1, 0, 0), z_dir=(0, 1, 0)).offset(BOSS_EXTRUDE18_START)):
        Polygon((-70, -265), (-170, -260.5), (-170, -265), align=None)
        Polygon((-170, 15), (-170, 10.5), (-70, 15), align=None)
    extrude(amount=BOSS_EXTRUDE18_DEPTH)

    # Fillet4
    fillet4_edges = [part_1.edges().sort_by_distance(p)[0] for p in [
        (31, 15.353553391, 0),
        (28.5, 15.353553391, 21.588909521),
        (28.5, 15.353553391, 85.287508801),
        (28.5, 15.353553391, 144.615102231),
        (31, 15.353553391, 250),
        (28.5, 15.353553391, 216.963197571),
    ]]
    fillet(fillet4_edges, radius=FILLET4_R - 0.0001)  # a hair under: the kernel refuses the full size

    # Sketch18 → Boss-Extrude21 (add)
    with BuildSketch(Plane(origin=(0, 35.353553391, 0), x_dir=(1, 0, 0), z_dir=(0, 1, 0)).offset(BOSS_EXTRUDE21_START)):
        with BuildLine():
            Line((-34.5, -250), (-34.5, -265))
            Line((-34.5, -265), (33.5, -265))
            Line((33.5, -265), (33.5, -250))
            Line((33.5, -250), (-23.5, -250))
            ThreePointArc((-23.5, -250), (-24.207106781, -249.707106781), (-24.5, -249))
            Line((-24.5, -249), (-24.5, -235))
            Line((-24.5, -235), (-34.5, -235))
            Line((-34.5, -235), (-34.5, -250))
        make_face()
        with BuildLine():
            Line((-34.5, 15), (-34.5, 0))
            Line((-34.5, 0), (-34.5, -15))
            Line((-34.5, -15), (-24.5, -15))
            Line((-24.5, -15), (-24.5, -1))
            ThreePointArc((-24.5, -1), (-24.207106781, -0.292893219), (-23.5, 0))
            Line((-23.5, 0), (33.5, 0))
            Line((33.5, 0), (33.5, 15))
            Line((33.5, 15), (-34.5, 15))
        make_face()
    extrude(amount=-BOSS_EXTRUDE21_DEPTH)

    # Sketch19 → Cut-Extrude7 (cut)
    with BuildSketch(Plane(origin=(0, 15.353553391, 0), x_dir=(1, 0, 0), z_dir=(0, 1, 0))):
        with Locations(Location((-154, -9.5, 0), (0, 0, 270))):
            Circle(SKETCH19_R)
        with Locations(Location((-104, -9.5, 0), (0, 0, 270))):
            Circle(SKETCH19_R)
        with Locations(Location((-104, -240.5, 0), (0, 0, 270))):
            Circle(SKETCH19_R)
        with Locations(Location((-154, -240.5, 0), (0, 0, 270))):
            Circle(SKETCH19_R)
    extrude(amount=-CUT_EXTRUDE7_DEPTH, mode=Mode.SUBTRACT)

    # Sketch20 → Cut-Extrude8 (cut, two sides: drawn at the far end of the back side and taken through both)
    with BuildSketch(Plane(origin=(0, 0, 256), x_dir=(-1, 0, 0), z_dir=(0, 0, -1)).offset(-CUT_EXTRUDE8_DEPTH_BACK)):
        with Locations(Location((104, 25.353553391, 0), (0, 0, 180))):
            Circle(SKETCH20_R)
        with Locations(Location((154, 25.353553391, 0), (0, 0, 180))):
            Circle(SKETCH20_R)
    extrude(amount=CUT_EXTRUDE8_DEPTH + CUT_EXTRUDE8_DEPTH_BACK, mode=Mode.SUBTRACT)

    # Sketch21 → Cut-Extrude9 (cut)
    with BuildSketch(Plane.XY):
        with Locations((6, 114.104067276)):
            Rectangle(SKETCH21_W, SKETCH21_H)
    extrude(amount=CUT_EXTRUDE9_DEPTH, mode=Mode.SUBTRACT)


with BuildPart() as cut_extrude10_tool:
    # Sketch22 → Cut-Extrude10 (new body)
    with BuildSketch(Plane(origin=(0, 0, 0), x_dir=(1, 0, 0), z_dir=(0, 1, 0))):
        Polygon((-126.5, 15), (-186.5, 15), (-186.5, -265), (-126.5, -265), (-126.5, -130), (-126.5, -120), align=None)
        with Locations((-46.5, -197.5)):
            Rectangle(SKETCH22_W, SKETCH22_H)
        with Locations((-46.5, -125)):
            Rectangle(SKETCH22_W, SKETCH22_H_2)
    extrude(amount=CUT_EXTRUDE10_DEPTH)


with BuildPart() as part_2:
    add(part_1.part)

    # Cut-Extrude10: cut by cut_extrude10_tool
    add(cut_extrude10_tool.part, mode=Mode.SUBTRACT)


with BuildPart() as lpattern1_2_1:
    add(lpattern1_2.part)

    # Cut-Extrude10: cut by cut_extrude10_tool
    add(cut_extrude10_tool.part, mode=Mode.SUBTRACT)


with BuildPart() as lpattern1_3_1:
    add(lpattern1_3.part)

    # Cut-Extrude10: cut by cut_extrude10_tool
    add(cut_extrude10_tool.part, mode=Mode.SUBTRACT)


with BuildPart() as lpattern1_5_1:
    add(lpattern1_5.part)

    # Cut-Extrude10: cut by cut_extrude10_tool
    add(cut_extrude10_tool.part, mode=Mode.SUBTRACT)


with BuildPart() as lpattern1_6_1:
    add(lpattern1_6.part)

    # Cut-Extrude10: cut by cut_extrude10_tool
    add(cut_extrude10_tool.part, mode=Mode.SUBTRACT)


solid = Compound([lpattern1_1.part, lpattern1_4.part, part_2.part])
